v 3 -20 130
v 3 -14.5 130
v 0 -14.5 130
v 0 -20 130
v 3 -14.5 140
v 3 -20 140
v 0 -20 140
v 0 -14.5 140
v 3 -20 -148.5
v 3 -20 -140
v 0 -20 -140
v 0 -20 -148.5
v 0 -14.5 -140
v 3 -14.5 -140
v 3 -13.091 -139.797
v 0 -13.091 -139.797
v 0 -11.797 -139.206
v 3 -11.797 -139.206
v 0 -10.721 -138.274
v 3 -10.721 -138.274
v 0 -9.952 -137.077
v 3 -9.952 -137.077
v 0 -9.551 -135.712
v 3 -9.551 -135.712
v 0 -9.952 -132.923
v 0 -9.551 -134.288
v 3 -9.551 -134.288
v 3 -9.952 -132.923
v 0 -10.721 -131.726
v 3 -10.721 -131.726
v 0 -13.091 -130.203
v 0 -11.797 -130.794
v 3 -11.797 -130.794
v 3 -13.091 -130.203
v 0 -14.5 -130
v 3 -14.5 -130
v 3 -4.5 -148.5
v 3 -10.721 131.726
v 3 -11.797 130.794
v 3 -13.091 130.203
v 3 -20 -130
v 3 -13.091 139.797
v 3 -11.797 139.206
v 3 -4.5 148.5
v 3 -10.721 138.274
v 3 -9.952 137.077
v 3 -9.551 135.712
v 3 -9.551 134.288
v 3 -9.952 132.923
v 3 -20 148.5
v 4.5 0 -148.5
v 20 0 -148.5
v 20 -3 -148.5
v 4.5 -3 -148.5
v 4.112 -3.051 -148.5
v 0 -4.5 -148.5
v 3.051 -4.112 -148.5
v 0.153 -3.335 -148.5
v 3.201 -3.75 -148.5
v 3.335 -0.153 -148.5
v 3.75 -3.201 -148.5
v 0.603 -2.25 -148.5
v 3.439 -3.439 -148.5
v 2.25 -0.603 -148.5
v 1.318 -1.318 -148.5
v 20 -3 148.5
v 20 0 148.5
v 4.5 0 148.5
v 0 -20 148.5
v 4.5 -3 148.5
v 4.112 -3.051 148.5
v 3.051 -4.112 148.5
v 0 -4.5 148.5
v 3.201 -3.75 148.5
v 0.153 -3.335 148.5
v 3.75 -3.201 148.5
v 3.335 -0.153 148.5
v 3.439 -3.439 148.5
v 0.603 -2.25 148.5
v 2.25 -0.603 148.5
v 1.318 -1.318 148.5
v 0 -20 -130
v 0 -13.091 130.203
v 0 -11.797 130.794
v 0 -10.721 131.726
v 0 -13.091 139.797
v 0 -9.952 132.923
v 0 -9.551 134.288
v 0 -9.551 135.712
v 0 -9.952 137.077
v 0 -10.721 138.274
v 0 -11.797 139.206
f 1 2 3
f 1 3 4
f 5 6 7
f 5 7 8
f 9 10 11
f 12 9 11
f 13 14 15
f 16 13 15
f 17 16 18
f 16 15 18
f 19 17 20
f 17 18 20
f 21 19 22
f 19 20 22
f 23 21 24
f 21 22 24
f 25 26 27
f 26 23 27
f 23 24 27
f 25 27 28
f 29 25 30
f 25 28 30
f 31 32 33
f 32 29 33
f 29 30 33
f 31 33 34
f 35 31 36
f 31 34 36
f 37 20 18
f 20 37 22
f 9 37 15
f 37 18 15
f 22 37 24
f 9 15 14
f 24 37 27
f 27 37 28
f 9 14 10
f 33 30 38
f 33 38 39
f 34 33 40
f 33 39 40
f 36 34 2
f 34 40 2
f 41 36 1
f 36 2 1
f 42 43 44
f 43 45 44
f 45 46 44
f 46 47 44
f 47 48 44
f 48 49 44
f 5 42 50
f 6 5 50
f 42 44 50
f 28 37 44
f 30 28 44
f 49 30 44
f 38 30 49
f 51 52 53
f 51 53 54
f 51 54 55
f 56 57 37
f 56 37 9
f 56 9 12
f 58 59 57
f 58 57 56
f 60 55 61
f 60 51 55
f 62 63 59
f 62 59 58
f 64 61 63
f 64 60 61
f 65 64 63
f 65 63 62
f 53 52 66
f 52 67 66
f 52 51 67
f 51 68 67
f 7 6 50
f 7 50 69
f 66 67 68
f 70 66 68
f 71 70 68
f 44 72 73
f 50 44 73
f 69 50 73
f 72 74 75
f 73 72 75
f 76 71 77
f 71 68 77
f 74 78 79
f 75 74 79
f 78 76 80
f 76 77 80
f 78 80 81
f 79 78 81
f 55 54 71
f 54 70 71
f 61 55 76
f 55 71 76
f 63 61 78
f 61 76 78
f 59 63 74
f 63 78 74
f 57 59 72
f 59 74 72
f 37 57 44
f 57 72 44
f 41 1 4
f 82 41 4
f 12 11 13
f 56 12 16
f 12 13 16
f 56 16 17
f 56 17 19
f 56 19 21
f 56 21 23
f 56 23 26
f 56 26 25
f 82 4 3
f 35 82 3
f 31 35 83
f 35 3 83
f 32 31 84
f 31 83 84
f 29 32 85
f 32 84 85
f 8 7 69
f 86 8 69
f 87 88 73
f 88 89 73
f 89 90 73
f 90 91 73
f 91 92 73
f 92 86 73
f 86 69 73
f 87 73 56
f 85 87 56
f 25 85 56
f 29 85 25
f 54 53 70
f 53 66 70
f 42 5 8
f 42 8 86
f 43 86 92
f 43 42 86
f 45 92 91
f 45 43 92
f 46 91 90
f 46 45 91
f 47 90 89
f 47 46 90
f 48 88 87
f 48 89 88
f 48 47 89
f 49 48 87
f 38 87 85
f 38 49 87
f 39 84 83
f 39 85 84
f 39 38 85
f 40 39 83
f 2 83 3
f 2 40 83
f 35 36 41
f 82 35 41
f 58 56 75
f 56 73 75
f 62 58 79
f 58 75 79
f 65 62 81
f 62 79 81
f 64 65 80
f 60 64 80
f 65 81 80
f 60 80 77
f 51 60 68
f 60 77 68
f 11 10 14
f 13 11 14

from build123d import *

# Parameters (mm, degrees)
SM_BASE_FLANGE_1_DEPTH = 148.5
CUT_EXTRUDE_1_DEPTH    = 151.802022533


# Sheet-metal steps are written as plain solids
with BuildPart() as part:
    # Sketch 2 → Базовая кромка1 (new body)
    with BuildSketch(Plane.XY):
        with BuildLine():
            Line((0, -20), (0, -4.5))
            ThreePointArc((0, -4.5), (1.318019485, -1.318019485), (4.5, 0))
            Line((4.5, 0), (20, 0))
            Line((20, 0), (20, -3))
            Line((20, -3), (4.5, -3))
            ThreePointArc((4.5, -3), (3.439339828, -3.439339828), (3, -4.5))
            Line((3, -4.5), (3, -20))
            Line((3, -20), (0, -20))
        make_face()
    extrude(amount=SM_BASE_FLANGE_1_DEPTH)

    # Эскиз10 → Вырез-Вытянуть1 (cut, through all)
    with BuildSketch(Plane(origin=(3, 0, 0), x_dir=(0, 0, -1), z_dir=(1, 0, 0))):
        with BuildLine():
            Line((-140, -25.5), (-140, -14.5))
            ThreePointArc((-140, -14.5), (-135, -9.5), (-130, -14.5))
            Line((-130, -14.5), (-130, -25.5))
            ThreePointArc((-130, -25.5), (-135, -30.5), (-140, -25.5))
        make_face()
    extrude(amount=-CUT_EXTRUDE_1_DEPTH, mode=Mode.SUBTRACT)

    # Зеркальное отражение1: part across plane


with BuildPart() as part_1:
    add(part.part)
    add(part.part.mirror(Plane(origin=(4.5, -4.5, 0), x_dir=(1, 0, 0), z_dir=(0, 0, 1))))


solid = part_1.part
